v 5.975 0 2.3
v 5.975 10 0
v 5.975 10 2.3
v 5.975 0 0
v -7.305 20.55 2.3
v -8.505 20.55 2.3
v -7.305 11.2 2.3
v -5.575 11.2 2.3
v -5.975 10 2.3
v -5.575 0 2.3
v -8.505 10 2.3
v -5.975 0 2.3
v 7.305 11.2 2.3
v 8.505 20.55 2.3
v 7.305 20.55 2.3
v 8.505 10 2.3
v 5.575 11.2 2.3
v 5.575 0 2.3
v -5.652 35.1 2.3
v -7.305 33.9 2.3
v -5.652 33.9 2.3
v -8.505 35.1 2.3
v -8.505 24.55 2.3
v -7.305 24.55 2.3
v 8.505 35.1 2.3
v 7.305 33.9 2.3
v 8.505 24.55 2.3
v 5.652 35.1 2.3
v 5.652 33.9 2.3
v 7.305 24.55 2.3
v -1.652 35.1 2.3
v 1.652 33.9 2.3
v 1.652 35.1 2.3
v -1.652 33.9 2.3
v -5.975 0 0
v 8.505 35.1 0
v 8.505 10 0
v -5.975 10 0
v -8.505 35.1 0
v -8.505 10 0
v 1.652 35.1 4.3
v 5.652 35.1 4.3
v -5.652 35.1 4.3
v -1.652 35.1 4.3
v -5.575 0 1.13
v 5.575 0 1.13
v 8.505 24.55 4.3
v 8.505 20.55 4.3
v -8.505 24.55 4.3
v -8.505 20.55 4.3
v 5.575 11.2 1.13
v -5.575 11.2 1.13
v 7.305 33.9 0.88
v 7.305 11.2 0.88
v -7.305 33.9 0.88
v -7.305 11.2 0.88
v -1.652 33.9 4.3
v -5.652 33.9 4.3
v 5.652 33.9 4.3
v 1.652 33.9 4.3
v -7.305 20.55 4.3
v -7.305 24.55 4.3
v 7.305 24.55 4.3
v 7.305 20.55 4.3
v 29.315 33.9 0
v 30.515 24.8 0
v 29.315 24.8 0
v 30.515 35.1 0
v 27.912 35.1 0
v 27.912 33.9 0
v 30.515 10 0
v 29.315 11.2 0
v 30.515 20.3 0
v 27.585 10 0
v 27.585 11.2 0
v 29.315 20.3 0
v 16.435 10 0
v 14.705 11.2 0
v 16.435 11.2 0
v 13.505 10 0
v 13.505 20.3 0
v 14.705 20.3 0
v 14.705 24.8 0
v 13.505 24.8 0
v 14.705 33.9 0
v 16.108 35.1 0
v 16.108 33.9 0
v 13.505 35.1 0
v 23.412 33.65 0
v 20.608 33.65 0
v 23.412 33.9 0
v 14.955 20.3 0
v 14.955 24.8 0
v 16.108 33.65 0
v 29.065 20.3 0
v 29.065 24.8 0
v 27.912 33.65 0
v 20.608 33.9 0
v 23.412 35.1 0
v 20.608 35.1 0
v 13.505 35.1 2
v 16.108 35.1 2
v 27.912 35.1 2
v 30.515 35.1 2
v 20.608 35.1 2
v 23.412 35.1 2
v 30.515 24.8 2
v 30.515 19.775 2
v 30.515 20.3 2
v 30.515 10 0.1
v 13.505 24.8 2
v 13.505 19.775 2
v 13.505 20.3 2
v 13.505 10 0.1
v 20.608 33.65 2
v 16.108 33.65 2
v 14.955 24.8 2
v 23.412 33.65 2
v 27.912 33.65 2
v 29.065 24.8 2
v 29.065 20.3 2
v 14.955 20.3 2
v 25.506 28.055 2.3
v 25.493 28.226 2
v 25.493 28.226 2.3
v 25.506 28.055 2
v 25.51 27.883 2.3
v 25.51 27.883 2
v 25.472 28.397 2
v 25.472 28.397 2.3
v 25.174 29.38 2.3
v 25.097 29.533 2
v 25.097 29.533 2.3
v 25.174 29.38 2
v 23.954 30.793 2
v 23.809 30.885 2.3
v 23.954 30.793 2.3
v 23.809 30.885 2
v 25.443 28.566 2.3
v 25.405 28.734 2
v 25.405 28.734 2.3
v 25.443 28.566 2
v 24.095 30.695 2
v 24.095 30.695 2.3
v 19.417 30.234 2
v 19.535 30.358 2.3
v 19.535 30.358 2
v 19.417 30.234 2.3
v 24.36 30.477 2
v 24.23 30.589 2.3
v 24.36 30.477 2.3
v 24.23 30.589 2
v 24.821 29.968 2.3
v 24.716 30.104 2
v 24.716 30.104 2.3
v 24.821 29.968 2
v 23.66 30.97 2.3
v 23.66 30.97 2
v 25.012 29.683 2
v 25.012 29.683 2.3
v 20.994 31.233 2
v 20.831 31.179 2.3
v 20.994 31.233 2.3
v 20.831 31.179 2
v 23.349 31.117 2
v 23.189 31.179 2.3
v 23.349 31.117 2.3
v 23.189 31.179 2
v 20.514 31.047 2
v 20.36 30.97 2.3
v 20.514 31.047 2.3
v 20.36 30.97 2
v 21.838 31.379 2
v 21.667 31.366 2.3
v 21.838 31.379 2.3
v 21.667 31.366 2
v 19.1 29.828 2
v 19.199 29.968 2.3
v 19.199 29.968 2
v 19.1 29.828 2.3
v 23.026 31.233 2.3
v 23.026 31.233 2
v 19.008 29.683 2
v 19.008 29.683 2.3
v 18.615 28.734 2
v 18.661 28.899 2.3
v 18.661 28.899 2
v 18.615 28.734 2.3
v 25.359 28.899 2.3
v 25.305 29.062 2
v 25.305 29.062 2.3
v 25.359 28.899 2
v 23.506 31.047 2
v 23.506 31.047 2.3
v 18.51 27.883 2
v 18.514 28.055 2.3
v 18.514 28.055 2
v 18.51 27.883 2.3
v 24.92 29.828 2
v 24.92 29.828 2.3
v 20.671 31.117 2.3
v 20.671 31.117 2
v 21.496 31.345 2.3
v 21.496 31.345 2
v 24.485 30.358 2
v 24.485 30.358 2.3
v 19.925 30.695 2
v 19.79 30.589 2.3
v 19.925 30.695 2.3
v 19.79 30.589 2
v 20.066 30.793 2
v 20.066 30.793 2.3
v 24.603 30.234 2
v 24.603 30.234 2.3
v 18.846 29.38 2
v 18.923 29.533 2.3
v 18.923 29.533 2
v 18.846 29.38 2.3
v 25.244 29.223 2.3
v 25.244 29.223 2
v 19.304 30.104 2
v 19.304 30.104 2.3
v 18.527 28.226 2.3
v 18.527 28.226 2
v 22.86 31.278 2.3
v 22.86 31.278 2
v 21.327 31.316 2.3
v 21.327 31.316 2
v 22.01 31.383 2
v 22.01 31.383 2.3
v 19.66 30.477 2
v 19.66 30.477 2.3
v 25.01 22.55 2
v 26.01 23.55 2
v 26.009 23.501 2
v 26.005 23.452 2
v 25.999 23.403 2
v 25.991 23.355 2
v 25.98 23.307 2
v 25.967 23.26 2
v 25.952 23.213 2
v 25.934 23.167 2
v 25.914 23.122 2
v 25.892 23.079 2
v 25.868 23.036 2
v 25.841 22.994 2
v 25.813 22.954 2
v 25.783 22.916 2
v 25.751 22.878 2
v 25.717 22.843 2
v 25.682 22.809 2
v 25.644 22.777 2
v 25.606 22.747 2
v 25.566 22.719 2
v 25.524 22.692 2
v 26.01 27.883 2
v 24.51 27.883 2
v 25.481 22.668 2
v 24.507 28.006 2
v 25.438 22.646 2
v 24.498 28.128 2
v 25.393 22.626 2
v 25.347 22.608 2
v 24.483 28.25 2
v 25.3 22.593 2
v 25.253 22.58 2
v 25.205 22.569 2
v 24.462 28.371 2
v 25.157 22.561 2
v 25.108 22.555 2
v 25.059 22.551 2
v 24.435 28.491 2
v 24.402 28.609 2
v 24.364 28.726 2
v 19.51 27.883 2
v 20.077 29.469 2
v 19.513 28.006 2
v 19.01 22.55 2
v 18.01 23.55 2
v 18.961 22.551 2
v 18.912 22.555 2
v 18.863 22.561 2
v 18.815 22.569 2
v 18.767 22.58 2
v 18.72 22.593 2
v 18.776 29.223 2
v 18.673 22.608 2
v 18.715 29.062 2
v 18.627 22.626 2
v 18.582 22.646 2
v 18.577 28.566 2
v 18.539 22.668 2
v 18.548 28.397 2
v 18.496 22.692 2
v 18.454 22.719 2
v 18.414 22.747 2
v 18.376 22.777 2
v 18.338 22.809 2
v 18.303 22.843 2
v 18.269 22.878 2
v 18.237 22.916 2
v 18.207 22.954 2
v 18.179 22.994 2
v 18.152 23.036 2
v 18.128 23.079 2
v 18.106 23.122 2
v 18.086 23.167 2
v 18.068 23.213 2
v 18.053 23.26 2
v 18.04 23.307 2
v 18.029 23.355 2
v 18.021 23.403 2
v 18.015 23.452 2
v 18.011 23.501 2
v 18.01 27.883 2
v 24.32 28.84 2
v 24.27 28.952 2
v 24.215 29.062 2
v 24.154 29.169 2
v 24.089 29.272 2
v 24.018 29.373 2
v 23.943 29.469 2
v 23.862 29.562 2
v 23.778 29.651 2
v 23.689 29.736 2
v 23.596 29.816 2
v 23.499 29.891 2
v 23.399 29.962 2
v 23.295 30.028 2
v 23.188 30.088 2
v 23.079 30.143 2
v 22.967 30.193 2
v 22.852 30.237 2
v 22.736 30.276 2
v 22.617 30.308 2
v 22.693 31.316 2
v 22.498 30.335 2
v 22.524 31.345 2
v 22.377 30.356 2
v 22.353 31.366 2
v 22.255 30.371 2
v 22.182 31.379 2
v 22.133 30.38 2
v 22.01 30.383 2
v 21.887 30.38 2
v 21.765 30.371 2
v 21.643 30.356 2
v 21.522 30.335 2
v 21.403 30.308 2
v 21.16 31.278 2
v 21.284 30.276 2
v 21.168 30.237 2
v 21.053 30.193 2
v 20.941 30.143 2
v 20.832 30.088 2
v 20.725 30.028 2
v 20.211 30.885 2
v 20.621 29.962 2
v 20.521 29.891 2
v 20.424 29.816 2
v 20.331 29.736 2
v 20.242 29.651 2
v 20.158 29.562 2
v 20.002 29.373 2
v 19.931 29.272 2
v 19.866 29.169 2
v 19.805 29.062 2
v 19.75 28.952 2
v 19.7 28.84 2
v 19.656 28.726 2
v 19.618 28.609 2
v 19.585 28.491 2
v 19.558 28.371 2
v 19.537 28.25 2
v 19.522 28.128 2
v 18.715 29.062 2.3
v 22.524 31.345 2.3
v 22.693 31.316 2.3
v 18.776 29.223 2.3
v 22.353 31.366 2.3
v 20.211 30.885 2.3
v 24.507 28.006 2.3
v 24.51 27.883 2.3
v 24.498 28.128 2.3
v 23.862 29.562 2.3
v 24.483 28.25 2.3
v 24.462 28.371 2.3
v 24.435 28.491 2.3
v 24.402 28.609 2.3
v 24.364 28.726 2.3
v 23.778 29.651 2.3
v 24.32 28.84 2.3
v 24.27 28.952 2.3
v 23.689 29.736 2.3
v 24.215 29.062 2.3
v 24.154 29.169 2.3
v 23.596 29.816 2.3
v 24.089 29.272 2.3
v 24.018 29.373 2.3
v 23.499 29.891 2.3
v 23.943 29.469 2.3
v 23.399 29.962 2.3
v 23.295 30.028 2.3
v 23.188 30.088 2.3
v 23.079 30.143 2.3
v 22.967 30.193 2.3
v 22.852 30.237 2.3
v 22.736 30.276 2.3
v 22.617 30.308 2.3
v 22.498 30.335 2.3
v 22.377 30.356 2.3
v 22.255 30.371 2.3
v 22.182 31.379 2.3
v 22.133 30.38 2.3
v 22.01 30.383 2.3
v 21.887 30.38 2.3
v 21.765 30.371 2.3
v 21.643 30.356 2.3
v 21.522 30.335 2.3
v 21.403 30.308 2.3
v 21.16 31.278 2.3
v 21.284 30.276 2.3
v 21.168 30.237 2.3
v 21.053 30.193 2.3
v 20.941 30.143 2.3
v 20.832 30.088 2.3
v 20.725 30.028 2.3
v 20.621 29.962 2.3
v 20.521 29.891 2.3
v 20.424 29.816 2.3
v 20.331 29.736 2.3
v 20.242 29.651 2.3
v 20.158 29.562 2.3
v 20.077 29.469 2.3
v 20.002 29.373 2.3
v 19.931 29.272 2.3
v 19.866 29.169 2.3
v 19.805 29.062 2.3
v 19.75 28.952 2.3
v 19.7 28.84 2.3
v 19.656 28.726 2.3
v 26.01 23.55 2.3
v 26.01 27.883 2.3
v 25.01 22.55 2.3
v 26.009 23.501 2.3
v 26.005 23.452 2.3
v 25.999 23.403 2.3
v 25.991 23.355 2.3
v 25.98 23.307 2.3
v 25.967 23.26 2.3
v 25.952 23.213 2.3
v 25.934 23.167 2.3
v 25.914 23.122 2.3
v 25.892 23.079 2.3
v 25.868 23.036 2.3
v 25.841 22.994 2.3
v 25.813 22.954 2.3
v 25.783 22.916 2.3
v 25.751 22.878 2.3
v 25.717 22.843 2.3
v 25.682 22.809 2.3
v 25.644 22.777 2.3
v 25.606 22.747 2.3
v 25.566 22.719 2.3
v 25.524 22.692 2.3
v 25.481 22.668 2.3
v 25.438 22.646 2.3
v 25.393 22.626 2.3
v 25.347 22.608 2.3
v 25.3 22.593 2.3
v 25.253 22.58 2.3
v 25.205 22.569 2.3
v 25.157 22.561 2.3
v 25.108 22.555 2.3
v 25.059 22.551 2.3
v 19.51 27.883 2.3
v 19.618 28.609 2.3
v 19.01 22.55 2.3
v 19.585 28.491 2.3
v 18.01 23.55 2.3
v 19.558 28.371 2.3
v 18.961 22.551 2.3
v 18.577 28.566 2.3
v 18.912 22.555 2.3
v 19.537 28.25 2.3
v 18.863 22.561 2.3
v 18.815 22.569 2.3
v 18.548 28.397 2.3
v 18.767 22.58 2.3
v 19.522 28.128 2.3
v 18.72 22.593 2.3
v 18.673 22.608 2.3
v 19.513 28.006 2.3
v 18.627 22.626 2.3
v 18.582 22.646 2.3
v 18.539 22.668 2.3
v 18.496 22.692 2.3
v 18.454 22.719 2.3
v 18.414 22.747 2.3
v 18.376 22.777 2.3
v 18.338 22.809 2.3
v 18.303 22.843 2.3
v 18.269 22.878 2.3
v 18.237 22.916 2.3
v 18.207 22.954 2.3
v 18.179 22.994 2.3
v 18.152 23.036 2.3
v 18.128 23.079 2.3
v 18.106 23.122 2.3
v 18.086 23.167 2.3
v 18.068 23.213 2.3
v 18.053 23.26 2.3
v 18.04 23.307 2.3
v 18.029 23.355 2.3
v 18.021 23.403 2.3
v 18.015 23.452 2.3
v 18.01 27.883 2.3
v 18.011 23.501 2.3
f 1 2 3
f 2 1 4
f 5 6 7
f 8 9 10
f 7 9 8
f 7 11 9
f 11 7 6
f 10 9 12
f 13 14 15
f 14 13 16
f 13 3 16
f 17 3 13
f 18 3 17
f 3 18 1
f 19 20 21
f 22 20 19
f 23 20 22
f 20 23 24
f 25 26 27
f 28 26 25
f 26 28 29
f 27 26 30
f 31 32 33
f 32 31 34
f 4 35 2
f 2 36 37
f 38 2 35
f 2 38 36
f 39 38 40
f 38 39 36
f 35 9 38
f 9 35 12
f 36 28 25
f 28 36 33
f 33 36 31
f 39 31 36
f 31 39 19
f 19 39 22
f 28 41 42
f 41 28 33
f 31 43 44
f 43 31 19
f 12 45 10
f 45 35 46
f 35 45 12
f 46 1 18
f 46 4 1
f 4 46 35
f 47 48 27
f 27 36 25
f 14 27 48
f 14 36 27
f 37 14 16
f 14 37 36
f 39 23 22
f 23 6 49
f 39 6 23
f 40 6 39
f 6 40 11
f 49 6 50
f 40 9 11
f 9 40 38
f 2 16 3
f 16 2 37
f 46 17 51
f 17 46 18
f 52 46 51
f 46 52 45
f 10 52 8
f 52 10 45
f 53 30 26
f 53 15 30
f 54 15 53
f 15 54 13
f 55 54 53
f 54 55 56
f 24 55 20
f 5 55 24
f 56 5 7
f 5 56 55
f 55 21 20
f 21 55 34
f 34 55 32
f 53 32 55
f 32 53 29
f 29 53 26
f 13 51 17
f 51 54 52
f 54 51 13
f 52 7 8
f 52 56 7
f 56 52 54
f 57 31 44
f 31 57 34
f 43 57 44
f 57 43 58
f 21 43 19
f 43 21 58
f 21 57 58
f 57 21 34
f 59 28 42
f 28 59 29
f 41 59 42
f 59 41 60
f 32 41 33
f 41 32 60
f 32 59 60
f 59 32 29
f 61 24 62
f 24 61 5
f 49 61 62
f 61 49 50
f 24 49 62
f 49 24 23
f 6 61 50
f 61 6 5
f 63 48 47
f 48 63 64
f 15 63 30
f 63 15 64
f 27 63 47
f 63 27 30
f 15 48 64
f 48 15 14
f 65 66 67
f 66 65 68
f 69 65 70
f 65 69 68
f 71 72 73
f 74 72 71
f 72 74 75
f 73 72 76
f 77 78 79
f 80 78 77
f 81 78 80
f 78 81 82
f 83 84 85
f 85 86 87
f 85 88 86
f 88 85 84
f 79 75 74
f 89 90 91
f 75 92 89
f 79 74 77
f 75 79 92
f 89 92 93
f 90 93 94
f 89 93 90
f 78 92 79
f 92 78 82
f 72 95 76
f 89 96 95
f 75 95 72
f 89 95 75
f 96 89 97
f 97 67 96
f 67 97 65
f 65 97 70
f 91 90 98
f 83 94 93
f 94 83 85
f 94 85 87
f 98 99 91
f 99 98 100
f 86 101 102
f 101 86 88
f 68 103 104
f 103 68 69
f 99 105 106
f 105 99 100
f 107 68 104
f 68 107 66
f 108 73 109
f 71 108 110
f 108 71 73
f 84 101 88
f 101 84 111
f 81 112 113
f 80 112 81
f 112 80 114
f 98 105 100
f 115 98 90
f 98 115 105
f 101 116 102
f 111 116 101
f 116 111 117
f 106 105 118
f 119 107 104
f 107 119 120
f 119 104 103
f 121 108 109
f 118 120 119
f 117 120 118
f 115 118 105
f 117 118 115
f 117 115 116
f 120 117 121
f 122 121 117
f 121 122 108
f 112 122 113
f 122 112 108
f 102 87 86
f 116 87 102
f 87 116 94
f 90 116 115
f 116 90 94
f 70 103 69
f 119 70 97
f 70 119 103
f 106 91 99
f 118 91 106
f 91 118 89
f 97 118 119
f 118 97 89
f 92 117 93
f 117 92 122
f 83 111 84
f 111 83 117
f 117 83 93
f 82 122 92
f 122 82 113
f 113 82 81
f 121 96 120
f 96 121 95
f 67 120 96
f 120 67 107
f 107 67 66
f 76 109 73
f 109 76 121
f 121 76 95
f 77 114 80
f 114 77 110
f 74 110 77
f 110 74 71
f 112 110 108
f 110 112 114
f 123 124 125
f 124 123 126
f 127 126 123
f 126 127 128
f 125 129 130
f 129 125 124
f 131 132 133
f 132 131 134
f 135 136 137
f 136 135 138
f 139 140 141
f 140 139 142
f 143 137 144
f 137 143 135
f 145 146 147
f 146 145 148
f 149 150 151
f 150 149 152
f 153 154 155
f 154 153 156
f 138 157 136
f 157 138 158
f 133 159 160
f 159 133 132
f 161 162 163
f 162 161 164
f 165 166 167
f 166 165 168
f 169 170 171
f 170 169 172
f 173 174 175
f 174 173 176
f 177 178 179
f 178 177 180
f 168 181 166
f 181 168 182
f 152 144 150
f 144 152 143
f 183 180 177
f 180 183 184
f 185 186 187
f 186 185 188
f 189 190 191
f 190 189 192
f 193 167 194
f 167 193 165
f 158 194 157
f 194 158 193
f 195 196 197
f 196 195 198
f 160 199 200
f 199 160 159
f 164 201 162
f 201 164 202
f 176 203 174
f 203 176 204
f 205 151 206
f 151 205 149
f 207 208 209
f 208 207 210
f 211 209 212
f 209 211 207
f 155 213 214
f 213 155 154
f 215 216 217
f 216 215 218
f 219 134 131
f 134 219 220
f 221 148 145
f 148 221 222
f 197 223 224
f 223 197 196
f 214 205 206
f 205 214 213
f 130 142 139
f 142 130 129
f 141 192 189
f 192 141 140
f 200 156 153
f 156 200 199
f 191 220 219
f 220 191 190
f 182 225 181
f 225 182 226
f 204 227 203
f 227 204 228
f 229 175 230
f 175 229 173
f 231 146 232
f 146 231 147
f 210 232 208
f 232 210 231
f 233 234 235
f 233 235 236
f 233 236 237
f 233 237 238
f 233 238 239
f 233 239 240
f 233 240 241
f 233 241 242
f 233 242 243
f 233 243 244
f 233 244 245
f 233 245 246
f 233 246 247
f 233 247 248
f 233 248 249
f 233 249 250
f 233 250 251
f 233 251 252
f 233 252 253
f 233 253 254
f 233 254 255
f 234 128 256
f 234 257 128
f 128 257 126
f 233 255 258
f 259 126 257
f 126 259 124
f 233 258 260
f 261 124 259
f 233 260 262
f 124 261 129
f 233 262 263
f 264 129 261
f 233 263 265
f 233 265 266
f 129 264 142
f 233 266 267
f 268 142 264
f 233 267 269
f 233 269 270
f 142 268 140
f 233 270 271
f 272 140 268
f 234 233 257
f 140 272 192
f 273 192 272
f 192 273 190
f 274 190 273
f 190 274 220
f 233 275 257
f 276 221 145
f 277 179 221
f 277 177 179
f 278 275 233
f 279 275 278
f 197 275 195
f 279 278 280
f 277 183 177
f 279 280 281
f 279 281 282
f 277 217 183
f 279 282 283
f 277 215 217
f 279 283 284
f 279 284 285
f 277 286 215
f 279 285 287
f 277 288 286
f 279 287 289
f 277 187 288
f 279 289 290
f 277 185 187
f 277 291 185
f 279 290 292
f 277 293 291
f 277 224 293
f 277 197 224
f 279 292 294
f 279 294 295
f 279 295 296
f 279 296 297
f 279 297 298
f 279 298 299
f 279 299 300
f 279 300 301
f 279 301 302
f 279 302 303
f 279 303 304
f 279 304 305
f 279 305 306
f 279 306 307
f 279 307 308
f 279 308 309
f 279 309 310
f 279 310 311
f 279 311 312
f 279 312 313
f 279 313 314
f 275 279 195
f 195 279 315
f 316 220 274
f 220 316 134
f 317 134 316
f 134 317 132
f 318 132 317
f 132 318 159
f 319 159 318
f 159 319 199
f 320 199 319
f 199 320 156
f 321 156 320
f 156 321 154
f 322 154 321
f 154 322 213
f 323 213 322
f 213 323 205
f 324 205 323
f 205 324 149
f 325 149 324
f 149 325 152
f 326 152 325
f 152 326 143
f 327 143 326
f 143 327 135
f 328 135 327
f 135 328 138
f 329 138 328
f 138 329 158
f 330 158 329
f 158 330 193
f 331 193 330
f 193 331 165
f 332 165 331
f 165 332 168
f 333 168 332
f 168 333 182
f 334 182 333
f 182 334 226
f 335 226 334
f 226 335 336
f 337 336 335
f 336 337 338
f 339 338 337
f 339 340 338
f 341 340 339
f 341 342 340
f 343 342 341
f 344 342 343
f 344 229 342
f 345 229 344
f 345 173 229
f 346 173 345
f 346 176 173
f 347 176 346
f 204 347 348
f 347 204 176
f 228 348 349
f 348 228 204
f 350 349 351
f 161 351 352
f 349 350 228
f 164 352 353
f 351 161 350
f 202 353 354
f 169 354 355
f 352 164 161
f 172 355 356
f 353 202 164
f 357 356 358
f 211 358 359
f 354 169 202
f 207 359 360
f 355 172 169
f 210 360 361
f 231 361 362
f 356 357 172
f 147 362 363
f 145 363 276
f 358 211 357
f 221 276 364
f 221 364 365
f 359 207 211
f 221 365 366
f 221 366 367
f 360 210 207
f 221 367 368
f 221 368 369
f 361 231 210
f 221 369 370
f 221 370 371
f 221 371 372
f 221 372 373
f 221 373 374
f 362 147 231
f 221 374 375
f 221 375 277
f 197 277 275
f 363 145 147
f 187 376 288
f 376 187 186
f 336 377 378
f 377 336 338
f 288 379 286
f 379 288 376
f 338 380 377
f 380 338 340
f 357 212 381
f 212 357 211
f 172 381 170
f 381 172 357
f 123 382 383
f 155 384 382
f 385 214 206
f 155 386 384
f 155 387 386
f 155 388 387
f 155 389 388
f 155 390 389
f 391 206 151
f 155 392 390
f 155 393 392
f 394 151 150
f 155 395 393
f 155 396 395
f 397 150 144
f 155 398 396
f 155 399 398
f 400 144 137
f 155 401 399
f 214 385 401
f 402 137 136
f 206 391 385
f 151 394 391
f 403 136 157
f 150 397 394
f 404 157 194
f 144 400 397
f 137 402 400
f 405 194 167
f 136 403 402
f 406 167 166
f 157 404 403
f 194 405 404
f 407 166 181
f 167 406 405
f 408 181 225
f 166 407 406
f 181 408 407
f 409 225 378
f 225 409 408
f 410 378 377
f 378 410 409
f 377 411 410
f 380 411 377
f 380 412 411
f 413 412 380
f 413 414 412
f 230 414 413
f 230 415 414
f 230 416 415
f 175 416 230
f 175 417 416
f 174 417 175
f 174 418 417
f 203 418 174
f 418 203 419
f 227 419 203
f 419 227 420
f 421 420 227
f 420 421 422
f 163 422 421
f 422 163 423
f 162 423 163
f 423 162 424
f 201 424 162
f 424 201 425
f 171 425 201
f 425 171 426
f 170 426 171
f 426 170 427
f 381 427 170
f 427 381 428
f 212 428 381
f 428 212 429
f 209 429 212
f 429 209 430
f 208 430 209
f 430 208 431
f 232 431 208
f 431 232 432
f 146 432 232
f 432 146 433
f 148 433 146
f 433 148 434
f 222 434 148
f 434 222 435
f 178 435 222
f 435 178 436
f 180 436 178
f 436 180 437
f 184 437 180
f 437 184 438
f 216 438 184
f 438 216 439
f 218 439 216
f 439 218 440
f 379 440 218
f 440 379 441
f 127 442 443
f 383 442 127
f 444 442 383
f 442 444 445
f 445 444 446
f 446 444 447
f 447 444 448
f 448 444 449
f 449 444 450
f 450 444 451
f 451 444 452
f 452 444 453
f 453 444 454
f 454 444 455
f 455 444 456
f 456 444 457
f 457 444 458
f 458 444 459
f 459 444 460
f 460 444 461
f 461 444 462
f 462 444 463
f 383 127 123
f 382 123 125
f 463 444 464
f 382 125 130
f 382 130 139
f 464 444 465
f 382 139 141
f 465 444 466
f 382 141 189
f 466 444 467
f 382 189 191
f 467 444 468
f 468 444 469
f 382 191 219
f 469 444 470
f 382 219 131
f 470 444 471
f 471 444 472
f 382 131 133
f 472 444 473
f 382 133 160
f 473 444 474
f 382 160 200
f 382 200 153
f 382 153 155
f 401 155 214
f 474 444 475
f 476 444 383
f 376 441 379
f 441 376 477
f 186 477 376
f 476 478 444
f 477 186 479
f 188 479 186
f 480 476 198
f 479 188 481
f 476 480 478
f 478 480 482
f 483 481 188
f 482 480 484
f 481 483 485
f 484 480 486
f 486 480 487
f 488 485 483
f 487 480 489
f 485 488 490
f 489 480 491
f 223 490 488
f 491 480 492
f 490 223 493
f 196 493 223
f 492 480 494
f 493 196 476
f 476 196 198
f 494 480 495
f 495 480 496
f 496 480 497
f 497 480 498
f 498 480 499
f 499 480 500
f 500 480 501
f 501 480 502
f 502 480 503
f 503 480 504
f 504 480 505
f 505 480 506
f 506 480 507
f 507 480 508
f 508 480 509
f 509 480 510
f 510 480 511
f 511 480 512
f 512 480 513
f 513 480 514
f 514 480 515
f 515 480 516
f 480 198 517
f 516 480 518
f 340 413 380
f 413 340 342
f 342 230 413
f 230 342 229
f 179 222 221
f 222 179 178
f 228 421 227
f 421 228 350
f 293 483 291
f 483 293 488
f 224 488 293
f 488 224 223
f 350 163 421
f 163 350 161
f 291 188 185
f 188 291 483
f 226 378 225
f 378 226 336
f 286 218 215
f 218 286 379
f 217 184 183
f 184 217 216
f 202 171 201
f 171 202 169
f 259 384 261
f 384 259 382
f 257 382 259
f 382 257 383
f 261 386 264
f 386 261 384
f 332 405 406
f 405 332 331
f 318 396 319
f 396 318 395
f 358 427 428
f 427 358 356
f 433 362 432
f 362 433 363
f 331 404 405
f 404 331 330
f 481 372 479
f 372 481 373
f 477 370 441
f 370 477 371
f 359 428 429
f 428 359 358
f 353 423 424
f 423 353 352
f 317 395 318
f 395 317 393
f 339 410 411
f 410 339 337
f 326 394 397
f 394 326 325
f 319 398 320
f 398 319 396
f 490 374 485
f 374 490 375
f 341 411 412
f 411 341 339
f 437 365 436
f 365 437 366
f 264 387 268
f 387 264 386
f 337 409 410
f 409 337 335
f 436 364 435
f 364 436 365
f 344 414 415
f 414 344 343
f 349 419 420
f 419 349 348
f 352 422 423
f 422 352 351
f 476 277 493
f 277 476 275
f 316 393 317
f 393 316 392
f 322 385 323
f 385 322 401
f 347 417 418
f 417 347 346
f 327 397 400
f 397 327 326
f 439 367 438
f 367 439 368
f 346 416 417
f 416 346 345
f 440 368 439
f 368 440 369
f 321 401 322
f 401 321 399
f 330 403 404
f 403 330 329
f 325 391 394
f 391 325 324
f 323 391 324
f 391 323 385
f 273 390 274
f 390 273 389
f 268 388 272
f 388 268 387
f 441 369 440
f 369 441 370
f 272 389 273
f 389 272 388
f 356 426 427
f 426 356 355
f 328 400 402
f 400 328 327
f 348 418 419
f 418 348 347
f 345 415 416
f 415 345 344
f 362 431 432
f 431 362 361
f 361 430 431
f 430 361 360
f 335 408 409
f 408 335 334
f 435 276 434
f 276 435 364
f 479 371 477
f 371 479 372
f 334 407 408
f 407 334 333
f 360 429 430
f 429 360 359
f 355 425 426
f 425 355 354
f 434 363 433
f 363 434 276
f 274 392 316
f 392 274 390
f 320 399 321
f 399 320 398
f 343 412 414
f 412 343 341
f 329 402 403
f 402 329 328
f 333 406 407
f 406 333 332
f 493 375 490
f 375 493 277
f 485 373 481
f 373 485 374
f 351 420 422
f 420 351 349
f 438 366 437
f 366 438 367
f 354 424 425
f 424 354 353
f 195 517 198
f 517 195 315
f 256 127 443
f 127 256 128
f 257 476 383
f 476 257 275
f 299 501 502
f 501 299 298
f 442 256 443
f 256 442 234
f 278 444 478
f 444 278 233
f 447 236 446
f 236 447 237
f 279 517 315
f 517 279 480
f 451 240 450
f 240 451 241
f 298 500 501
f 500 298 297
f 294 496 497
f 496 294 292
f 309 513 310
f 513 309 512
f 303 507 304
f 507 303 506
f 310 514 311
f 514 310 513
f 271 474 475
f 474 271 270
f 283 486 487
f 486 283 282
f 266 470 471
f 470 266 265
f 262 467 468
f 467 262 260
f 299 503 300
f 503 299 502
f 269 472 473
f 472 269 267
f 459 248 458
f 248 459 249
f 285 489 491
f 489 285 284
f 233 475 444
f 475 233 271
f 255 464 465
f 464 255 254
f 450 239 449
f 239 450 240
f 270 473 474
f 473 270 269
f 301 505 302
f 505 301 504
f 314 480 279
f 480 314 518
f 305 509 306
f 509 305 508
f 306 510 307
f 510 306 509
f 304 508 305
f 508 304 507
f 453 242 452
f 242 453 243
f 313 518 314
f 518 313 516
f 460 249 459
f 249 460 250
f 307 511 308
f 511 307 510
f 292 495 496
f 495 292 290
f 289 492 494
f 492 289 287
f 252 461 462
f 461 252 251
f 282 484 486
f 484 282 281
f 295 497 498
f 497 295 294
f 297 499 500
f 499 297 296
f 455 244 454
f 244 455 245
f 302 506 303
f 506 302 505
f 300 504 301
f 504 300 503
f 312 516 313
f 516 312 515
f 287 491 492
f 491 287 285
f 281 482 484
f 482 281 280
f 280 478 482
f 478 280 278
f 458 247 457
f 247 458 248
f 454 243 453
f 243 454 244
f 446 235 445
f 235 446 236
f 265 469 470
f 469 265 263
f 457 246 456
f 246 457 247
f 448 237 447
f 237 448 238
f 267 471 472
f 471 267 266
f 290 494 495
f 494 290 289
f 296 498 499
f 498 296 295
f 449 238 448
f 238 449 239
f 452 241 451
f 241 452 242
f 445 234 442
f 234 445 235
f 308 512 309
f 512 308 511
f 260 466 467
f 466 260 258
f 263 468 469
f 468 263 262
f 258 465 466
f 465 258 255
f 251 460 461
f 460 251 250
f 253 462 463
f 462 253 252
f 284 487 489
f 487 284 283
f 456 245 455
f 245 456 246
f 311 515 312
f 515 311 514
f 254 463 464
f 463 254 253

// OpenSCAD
/* [Fine Tuning] */
//wiggle room (pcb)
w=0.5;
//Nozzle size (for single walls)
n=0.4;
//wiggle room (pegs)
wp=0.25;

/* [USB Size] */
//USB Tip X
utx=10.65;
usbTipX=utx+w;
//USB Body X
ubx=14.11;
usbBodyX=ubx+w;

usbTipY=11.2;
//USB Body Y
uby=22.2;
usbBodyY=uby+w;

usbTipZ=1.17;
usbBodyZ=1.42;

/* [Other] */
//Part to create
part = "Both Seperate"; // [Top,Bottom,Both Seperate,Both Together]
lockSymbol=true;
topHeight=2;

/* [Hidden] */
finalTipZ=2.3;
finalTipX=usbTipX+n*2;//12.05;
finalBodyX=usbBodyX+n*6;//16.5;
finalY=usbTipY+usbBodyY+n*3;
finalTipYPlugDepth=10;
$fn=128;

if (part=="Top") {
    caseTop();
} else if (part=="Bottom") {
    caseBottom();
} else if (part=="Both Together") {
    //#usb();
    caseBottom();
    caseTop();
} else if (part=="Both Seperate") {
    caseBottom();
    translate([finalBodyX+5,0,-finalTipZ])caseTop();
}

module usb(extraZ=0,extraY=0){
    union()translate([0,0,finalTipZ-usbBodyZ]){
        translate([-usbTipX/2,-extraY,usbBodyZ-usbTipZ])
        color("green")cube([usbTipX,usbTipY+0.1+extraY,usbTipZ+extraZ]);
        translate([-usbBodyX/2,usbTipY,0])color("darkgreen")cube([usbBodyX,usbBodyY,usbBodyZ+extraZ]);
    }
}

module caseBottom(wp=0){
    difference(){
        color("orange")
        union(){
            translate([-finalTipX/2,0,0])cube([finalTipX,finalY,finalTipZ]);
            translate([-finalBodyX/2,finalTipYPlugDepth,0])cube([finalBodyX,finalY-finalTipYPlugDepth,finalTipZ]);
        }
        usb();
        usb(extraZ=1,extraY=1);
    }
    pegWidth=4+wp*2;
    echo (pegWidth=pegWidth);
    for(i=[-1,1]){
        translate([-pegWidth/2+usbBodyX/4*i,finalY-((finalY-usbBodyY-usbTipY)/2)-(n*3)/2-wp,finalTipZ])
        cube([pegWidth,n*3+wp,topHeight]);
    }
    for(i=[-1,1]){
        translate([-(n*3+wp)/2+(usbBodyX/2+(n*3-wp)/2)*i,-pegWidth/2+usbTipY+usbBodyY/2,finalTipZ])
        cube([n*3+wp,pegWidth,topHeight]);
    }
}

module caseTop(){
    difference(){
            union(){
            translate([-finalBodyX/2,finalTipYPlugDepth,finalTipZ])cube([finalBodyX,finalY-finalTipYPlugDepth,topHeight]);
        }
        translate([-(finalBodyX+1)/2,finalTipYPlugDepth,finalTipZ+0.1])rotate([11,0,0])cube([finalBodyX+1,usbBodyY/2,topHeight]);
        caseBottom(wp=wp);
    }
    //Lock symbol
    if (lockSymbol) {
        lockSize=8;
        lockHeight=0.3;
        cornerRad=1;
        color("orange")translate([-lockSize/2,usbTipY+usbBodyY-(usbBodyY/2),finalTipZ+topHeight]){
            hull(){
                translate([0,lockSize/3*2-cornerRad,0])cube([lockSize,cornerRad,lockHeight]);
                translate([cornerRad,cornerRad,0])cylinder(r=cornerRad,h=lockHeight);
                translate([lockSize-cornerRad,cornerRad,0])cylinder(r=cornerRad,h=lockHeight);
            }
            translate([lockSize/2,lockSize/3*2,0]) {
                difference(){
                    cylinder(r=lockSize/2-cornerRad/2,h=lockHeight);
                    cylinder(r=lockSize/2-cornerRad/2-1,h=lockHeight+0.1);
                }
            }
        }
    }
}














